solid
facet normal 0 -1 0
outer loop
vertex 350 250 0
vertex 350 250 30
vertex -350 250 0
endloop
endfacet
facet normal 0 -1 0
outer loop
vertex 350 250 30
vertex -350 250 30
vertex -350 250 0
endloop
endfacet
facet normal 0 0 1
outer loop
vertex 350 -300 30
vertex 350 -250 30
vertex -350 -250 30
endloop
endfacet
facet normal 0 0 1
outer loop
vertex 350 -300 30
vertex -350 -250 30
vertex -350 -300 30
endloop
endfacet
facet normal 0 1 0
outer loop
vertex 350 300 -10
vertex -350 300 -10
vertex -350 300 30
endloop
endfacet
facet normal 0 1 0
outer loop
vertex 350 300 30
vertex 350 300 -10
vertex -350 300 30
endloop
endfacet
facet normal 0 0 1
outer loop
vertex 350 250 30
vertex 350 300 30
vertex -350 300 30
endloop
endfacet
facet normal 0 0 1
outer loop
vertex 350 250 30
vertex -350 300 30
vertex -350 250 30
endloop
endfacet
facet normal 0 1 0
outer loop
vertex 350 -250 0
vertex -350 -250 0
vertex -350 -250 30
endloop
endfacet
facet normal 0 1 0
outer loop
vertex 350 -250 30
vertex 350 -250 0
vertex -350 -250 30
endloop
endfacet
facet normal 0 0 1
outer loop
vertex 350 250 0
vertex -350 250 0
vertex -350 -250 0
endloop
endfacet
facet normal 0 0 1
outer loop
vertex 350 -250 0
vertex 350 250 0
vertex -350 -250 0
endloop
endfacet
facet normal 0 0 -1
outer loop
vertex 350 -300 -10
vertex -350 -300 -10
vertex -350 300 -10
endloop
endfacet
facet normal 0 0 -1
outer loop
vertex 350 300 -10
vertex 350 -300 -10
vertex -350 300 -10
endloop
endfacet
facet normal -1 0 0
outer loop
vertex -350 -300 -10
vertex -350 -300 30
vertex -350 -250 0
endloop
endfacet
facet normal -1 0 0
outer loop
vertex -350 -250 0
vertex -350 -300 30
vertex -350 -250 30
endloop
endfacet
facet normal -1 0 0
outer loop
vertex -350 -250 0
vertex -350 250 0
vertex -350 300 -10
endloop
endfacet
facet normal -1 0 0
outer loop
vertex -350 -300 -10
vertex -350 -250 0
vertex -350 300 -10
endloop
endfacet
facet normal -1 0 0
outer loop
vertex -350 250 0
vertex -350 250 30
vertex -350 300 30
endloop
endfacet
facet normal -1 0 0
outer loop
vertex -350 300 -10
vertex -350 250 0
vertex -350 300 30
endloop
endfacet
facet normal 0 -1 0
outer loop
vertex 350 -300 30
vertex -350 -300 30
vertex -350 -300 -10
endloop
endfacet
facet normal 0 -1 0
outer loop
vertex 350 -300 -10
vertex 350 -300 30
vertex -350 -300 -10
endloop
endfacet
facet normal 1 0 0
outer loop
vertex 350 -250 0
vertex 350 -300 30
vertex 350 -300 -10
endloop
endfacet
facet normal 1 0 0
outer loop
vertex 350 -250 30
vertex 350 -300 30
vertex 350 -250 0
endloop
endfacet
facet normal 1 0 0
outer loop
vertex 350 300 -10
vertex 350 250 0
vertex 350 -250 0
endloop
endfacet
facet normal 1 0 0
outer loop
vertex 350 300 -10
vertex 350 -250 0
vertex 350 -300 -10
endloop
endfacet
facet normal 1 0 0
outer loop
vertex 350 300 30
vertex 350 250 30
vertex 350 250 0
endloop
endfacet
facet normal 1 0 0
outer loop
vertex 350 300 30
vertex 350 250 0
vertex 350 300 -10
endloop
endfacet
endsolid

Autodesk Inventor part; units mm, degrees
ref_plane "YZ Plane" through (0, 0, 0) normal (1, 0, 0) x (0, 1, 0)
ref_plane "XZ Plane" through (0, 0, 0) normal (0, 1, 0) x (-1, 0, 0)
ref_plane "XY Plane" through (0, 0, 0) normal (0, 0, 1) x (1, 0, 0)
sketch "Skizze1" plane through (0, 0, 0) normal (1, 0, 0) x (0, 1, 0)
  line L0 (300, 30) -> (250, 30)
  line L1 (250, 30) -> (250, 0)
  line L2 (250, 0) -> (300, 0)
  line L3 (300, 0) -> (300, 30)
  line L4 (-250, 30) -> (-300, 30)
  line L5 (-300, 30) -> (-300, 0)
  line L6 (-300, 0) -> (-250, 0)
  line L7 (-250, 0) -> (-250, 30)
  line L8 (300, 0) -> (-300, 0)
  line L9 (-300, 0) -> (-300, -10)
  line L10 (-300, -10) -> (300, -10)
  line L11 (300, -10) -> (300, 0)
  point P0 (0, 0)
  point P1 (0, 0)
  point P2 (250, 0)
  point P3 (-250, 0)
  dimension "d0" = 50
  dimension "d1" = 30
  dimension "d2" = 600
  dimension "d3" = 10
extrude "Extrusion1" add sketch "Skizze1" along normal mid plane 700
properties part number "Drawer" material "Holz (Birke)"
